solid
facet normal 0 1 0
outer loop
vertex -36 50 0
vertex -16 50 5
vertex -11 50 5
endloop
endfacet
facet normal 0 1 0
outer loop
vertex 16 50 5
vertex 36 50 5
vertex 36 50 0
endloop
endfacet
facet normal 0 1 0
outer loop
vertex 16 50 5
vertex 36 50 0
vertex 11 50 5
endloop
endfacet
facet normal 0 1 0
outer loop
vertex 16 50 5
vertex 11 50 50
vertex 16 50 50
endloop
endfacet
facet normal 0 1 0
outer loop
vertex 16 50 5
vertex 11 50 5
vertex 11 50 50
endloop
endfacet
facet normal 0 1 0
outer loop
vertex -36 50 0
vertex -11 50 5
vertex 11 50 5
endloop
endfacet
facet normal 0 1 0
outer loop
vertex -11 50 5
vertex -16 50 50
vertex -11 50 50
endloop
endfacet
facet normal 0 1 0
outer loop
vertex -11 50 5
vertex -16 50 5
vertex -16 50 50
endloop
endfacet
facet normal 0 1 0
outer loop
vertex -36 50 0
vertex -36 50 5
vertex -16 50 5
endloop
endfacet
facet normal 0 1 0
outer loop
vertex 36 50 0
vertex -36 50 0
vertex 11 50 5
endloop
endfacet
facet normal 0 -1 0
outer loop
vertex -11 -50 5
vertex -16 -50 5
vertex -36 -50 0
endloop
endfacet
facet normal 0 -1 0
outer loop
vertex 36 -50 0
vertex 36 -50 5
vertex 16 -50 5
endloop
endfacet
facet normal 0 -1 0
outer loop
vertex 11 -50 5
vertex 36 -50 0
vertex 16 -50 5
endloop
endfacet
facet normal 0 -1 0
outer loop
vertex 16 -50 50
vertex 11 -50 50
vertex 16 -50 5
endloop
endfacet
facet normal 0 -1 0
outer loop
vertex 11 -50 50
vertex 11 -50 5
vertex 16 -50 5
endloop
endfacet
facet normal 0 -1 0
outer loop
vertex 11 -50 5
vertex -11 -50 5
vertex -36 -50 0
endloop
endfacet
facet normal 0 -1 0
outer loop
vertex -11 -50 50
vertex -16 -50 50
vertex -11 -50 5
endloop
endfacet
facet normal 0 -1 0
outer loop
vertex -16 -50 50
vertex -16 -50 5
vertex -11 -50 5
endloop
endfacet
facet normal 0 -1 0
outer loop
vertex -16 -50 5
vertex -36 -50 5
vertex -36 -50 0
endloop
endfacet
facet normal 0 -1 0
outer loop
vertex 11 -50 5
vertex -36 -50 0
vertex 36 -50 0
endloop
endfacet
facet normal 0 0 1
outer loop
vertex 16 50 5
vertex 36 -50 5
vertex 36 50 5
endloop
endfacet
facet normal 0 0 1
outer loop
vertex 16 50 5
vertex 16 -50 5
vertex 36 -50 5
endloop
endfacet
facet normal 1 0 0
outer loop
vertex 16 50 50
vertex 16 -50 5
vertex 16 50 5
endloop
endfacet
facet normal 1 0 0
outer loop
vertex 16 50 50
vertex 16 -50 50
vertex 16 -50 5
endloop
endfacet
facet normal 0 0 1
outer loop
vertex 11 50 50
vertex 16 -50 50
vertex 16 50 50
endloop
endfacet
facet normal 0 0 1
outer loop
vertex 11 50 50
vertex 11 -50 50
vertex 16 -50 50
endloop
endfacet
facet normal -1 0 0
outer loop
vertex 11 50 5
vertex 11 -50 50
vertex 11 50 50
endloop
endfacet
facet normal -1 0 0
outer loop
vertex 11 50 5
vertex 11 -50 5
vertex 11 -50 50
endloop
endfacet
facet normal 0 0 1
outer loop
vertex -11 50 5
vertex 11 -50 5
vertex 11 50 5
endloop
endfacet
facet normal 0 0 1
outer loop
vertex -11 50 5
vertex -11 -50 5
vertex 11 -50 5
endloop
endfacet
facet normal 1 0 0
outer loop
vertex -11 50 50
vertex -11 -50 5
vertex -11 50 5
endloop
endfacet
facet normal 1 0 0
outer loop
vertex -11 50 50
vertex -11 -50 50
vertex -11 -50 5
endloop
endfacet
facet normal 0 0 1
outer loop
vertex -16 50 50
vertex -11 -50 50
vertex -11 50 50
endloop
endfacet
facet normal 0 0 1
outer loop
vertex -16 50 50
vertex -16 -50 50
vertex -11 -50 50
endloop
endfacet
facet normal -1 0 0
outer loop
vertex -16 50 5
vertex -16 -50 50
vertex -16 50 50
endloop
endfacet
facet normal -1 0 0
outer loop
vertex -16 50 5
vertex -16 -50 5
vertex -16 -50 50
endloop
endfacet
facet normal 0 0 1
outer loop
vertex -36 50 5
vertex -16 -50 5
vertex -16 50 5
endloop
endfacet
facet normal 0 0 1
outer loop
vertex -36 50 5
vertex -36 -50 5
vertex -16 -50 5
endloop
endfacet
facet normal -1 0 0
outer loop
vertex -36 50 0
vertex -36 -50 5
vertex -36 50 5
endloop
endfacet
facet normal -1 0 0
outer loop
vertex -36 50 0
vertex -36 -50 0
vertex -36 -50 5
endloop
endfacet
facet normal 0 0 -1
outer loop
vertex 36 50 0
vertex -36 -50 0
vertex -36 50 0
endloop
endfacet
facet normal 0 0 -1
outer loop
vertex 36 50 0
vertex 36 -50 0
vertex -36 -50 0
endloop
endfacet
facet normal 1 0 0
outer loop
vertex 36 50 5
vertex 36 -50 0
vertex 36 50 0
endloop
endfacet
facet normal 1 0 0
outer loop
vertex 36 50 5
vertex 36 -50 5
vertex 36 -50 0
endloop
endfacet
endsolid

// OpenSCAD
// Parametric vertical laptop stand, dimensions in mm and angles in degrees.
// Inspired by tacaa: https://www.thingiverse.com/thing:6851927
// This design is licensed CC BY-SA 4.0; see README.md.

/* [Laptop fit] */
// Vertical height covered above the supporting floor (not sloping wing length).
height = 45; // [10:1:120]
// Clear gap: at the floor in apart mode; perpendicular to wings in parallel mode.
width = 22; // [5:0.5:50]
// Stand size along the laptop's bottom edge.
length = 100; // [20:1:250]

/* [Support] */
// Horizontal foot extension beyond the complete wing envelope, on each side.
foot_width = 20; // [0:1:80]
// Apart = symmetric outward flare; parallel = both wings lean together.
wing_mode = "apart"; // [apart, parallel]
// Angle to desk: 90 = upright. Apart: 60-90; parallel: 60-120.
inclination = 90; // [60:1:120]
// Thickness measured perpendicular to each wing.
wing_thickness = 5; // [2:0.5:12]
// Thickness of the flat supporting floor.
base_thickness = 5; // [2:0.5:12]

/* [Hidden] */
assert(height > 0, "height must be positive");
assert(width > 0, "width must be positive");
assert(length > 0, "length must be positive");
assert(foot_width >= 0, "foot_width must be non-negative");
assert(inclination >= 60 && inclination <= 120,
       "inclination must be between 60 and 120 degrees");
assert(wing_mode == "apart" || wing_mode == "parallel", "unknown wing_mode");
assert(wing_mode != "apart" || inclination <= 90,
       "apart mode requires inclination between 60 and 90 degrees");
assert(wing_thickness > 0, "wing_thickness must be positive");
assert(base_thickness > 0, "base_thickness must be positive");

// Apart mode preserves the narrowest (floor) gap; parallel preserves normal gap.
gap_x = wing_mode == "apart" ? width : width / sin(inclination);
wall_x = wing_thickness / sin(inclination);
shift_x = height * cos(inclination) / sin(inclination);
left_shift = wing_mode == "apart" ? -shift_x : shift_x;
right_shift = shift_x;
outer_x = gap_x / 2 + wall_x;
base_left = -outer_x + min(0, left_shift) - foot_width;
base_right = outer_x + max(0, right_shift) + foot_width;

// A single 2D outline avoids coincident seams between the wings and floor.
// Profile coordinates are [across laptop thickness, vertical height].
module stand_profile() {
    polygon([
        [base_left, 0],
        [base_right, 0],
        [base_right, base_thickness],
        [outer_x, base_thickness],
        [outer_x + right_shift, base_thickness + height],
        [gap_x / 2 + right_shift, base_thickness + height],
        [gap_x / 2, base_thickness],
        [-gap_x / 2, base_thickness],
        [-gap_x / 2 + left_shift, base_thickness + height],
        [-outer_x + left_shift, base_thickness + height],
        [-outer_x, base_thickness],
        [base_left, base_thickness]
    ]);
}

// X = across slot, Y = along laptop, Z = up. Flat base sits at Z = 0.
rotate([90, 0, 0])
    linear_extrude(height = length, center = true, convexity = 4)
        stand_profile();
